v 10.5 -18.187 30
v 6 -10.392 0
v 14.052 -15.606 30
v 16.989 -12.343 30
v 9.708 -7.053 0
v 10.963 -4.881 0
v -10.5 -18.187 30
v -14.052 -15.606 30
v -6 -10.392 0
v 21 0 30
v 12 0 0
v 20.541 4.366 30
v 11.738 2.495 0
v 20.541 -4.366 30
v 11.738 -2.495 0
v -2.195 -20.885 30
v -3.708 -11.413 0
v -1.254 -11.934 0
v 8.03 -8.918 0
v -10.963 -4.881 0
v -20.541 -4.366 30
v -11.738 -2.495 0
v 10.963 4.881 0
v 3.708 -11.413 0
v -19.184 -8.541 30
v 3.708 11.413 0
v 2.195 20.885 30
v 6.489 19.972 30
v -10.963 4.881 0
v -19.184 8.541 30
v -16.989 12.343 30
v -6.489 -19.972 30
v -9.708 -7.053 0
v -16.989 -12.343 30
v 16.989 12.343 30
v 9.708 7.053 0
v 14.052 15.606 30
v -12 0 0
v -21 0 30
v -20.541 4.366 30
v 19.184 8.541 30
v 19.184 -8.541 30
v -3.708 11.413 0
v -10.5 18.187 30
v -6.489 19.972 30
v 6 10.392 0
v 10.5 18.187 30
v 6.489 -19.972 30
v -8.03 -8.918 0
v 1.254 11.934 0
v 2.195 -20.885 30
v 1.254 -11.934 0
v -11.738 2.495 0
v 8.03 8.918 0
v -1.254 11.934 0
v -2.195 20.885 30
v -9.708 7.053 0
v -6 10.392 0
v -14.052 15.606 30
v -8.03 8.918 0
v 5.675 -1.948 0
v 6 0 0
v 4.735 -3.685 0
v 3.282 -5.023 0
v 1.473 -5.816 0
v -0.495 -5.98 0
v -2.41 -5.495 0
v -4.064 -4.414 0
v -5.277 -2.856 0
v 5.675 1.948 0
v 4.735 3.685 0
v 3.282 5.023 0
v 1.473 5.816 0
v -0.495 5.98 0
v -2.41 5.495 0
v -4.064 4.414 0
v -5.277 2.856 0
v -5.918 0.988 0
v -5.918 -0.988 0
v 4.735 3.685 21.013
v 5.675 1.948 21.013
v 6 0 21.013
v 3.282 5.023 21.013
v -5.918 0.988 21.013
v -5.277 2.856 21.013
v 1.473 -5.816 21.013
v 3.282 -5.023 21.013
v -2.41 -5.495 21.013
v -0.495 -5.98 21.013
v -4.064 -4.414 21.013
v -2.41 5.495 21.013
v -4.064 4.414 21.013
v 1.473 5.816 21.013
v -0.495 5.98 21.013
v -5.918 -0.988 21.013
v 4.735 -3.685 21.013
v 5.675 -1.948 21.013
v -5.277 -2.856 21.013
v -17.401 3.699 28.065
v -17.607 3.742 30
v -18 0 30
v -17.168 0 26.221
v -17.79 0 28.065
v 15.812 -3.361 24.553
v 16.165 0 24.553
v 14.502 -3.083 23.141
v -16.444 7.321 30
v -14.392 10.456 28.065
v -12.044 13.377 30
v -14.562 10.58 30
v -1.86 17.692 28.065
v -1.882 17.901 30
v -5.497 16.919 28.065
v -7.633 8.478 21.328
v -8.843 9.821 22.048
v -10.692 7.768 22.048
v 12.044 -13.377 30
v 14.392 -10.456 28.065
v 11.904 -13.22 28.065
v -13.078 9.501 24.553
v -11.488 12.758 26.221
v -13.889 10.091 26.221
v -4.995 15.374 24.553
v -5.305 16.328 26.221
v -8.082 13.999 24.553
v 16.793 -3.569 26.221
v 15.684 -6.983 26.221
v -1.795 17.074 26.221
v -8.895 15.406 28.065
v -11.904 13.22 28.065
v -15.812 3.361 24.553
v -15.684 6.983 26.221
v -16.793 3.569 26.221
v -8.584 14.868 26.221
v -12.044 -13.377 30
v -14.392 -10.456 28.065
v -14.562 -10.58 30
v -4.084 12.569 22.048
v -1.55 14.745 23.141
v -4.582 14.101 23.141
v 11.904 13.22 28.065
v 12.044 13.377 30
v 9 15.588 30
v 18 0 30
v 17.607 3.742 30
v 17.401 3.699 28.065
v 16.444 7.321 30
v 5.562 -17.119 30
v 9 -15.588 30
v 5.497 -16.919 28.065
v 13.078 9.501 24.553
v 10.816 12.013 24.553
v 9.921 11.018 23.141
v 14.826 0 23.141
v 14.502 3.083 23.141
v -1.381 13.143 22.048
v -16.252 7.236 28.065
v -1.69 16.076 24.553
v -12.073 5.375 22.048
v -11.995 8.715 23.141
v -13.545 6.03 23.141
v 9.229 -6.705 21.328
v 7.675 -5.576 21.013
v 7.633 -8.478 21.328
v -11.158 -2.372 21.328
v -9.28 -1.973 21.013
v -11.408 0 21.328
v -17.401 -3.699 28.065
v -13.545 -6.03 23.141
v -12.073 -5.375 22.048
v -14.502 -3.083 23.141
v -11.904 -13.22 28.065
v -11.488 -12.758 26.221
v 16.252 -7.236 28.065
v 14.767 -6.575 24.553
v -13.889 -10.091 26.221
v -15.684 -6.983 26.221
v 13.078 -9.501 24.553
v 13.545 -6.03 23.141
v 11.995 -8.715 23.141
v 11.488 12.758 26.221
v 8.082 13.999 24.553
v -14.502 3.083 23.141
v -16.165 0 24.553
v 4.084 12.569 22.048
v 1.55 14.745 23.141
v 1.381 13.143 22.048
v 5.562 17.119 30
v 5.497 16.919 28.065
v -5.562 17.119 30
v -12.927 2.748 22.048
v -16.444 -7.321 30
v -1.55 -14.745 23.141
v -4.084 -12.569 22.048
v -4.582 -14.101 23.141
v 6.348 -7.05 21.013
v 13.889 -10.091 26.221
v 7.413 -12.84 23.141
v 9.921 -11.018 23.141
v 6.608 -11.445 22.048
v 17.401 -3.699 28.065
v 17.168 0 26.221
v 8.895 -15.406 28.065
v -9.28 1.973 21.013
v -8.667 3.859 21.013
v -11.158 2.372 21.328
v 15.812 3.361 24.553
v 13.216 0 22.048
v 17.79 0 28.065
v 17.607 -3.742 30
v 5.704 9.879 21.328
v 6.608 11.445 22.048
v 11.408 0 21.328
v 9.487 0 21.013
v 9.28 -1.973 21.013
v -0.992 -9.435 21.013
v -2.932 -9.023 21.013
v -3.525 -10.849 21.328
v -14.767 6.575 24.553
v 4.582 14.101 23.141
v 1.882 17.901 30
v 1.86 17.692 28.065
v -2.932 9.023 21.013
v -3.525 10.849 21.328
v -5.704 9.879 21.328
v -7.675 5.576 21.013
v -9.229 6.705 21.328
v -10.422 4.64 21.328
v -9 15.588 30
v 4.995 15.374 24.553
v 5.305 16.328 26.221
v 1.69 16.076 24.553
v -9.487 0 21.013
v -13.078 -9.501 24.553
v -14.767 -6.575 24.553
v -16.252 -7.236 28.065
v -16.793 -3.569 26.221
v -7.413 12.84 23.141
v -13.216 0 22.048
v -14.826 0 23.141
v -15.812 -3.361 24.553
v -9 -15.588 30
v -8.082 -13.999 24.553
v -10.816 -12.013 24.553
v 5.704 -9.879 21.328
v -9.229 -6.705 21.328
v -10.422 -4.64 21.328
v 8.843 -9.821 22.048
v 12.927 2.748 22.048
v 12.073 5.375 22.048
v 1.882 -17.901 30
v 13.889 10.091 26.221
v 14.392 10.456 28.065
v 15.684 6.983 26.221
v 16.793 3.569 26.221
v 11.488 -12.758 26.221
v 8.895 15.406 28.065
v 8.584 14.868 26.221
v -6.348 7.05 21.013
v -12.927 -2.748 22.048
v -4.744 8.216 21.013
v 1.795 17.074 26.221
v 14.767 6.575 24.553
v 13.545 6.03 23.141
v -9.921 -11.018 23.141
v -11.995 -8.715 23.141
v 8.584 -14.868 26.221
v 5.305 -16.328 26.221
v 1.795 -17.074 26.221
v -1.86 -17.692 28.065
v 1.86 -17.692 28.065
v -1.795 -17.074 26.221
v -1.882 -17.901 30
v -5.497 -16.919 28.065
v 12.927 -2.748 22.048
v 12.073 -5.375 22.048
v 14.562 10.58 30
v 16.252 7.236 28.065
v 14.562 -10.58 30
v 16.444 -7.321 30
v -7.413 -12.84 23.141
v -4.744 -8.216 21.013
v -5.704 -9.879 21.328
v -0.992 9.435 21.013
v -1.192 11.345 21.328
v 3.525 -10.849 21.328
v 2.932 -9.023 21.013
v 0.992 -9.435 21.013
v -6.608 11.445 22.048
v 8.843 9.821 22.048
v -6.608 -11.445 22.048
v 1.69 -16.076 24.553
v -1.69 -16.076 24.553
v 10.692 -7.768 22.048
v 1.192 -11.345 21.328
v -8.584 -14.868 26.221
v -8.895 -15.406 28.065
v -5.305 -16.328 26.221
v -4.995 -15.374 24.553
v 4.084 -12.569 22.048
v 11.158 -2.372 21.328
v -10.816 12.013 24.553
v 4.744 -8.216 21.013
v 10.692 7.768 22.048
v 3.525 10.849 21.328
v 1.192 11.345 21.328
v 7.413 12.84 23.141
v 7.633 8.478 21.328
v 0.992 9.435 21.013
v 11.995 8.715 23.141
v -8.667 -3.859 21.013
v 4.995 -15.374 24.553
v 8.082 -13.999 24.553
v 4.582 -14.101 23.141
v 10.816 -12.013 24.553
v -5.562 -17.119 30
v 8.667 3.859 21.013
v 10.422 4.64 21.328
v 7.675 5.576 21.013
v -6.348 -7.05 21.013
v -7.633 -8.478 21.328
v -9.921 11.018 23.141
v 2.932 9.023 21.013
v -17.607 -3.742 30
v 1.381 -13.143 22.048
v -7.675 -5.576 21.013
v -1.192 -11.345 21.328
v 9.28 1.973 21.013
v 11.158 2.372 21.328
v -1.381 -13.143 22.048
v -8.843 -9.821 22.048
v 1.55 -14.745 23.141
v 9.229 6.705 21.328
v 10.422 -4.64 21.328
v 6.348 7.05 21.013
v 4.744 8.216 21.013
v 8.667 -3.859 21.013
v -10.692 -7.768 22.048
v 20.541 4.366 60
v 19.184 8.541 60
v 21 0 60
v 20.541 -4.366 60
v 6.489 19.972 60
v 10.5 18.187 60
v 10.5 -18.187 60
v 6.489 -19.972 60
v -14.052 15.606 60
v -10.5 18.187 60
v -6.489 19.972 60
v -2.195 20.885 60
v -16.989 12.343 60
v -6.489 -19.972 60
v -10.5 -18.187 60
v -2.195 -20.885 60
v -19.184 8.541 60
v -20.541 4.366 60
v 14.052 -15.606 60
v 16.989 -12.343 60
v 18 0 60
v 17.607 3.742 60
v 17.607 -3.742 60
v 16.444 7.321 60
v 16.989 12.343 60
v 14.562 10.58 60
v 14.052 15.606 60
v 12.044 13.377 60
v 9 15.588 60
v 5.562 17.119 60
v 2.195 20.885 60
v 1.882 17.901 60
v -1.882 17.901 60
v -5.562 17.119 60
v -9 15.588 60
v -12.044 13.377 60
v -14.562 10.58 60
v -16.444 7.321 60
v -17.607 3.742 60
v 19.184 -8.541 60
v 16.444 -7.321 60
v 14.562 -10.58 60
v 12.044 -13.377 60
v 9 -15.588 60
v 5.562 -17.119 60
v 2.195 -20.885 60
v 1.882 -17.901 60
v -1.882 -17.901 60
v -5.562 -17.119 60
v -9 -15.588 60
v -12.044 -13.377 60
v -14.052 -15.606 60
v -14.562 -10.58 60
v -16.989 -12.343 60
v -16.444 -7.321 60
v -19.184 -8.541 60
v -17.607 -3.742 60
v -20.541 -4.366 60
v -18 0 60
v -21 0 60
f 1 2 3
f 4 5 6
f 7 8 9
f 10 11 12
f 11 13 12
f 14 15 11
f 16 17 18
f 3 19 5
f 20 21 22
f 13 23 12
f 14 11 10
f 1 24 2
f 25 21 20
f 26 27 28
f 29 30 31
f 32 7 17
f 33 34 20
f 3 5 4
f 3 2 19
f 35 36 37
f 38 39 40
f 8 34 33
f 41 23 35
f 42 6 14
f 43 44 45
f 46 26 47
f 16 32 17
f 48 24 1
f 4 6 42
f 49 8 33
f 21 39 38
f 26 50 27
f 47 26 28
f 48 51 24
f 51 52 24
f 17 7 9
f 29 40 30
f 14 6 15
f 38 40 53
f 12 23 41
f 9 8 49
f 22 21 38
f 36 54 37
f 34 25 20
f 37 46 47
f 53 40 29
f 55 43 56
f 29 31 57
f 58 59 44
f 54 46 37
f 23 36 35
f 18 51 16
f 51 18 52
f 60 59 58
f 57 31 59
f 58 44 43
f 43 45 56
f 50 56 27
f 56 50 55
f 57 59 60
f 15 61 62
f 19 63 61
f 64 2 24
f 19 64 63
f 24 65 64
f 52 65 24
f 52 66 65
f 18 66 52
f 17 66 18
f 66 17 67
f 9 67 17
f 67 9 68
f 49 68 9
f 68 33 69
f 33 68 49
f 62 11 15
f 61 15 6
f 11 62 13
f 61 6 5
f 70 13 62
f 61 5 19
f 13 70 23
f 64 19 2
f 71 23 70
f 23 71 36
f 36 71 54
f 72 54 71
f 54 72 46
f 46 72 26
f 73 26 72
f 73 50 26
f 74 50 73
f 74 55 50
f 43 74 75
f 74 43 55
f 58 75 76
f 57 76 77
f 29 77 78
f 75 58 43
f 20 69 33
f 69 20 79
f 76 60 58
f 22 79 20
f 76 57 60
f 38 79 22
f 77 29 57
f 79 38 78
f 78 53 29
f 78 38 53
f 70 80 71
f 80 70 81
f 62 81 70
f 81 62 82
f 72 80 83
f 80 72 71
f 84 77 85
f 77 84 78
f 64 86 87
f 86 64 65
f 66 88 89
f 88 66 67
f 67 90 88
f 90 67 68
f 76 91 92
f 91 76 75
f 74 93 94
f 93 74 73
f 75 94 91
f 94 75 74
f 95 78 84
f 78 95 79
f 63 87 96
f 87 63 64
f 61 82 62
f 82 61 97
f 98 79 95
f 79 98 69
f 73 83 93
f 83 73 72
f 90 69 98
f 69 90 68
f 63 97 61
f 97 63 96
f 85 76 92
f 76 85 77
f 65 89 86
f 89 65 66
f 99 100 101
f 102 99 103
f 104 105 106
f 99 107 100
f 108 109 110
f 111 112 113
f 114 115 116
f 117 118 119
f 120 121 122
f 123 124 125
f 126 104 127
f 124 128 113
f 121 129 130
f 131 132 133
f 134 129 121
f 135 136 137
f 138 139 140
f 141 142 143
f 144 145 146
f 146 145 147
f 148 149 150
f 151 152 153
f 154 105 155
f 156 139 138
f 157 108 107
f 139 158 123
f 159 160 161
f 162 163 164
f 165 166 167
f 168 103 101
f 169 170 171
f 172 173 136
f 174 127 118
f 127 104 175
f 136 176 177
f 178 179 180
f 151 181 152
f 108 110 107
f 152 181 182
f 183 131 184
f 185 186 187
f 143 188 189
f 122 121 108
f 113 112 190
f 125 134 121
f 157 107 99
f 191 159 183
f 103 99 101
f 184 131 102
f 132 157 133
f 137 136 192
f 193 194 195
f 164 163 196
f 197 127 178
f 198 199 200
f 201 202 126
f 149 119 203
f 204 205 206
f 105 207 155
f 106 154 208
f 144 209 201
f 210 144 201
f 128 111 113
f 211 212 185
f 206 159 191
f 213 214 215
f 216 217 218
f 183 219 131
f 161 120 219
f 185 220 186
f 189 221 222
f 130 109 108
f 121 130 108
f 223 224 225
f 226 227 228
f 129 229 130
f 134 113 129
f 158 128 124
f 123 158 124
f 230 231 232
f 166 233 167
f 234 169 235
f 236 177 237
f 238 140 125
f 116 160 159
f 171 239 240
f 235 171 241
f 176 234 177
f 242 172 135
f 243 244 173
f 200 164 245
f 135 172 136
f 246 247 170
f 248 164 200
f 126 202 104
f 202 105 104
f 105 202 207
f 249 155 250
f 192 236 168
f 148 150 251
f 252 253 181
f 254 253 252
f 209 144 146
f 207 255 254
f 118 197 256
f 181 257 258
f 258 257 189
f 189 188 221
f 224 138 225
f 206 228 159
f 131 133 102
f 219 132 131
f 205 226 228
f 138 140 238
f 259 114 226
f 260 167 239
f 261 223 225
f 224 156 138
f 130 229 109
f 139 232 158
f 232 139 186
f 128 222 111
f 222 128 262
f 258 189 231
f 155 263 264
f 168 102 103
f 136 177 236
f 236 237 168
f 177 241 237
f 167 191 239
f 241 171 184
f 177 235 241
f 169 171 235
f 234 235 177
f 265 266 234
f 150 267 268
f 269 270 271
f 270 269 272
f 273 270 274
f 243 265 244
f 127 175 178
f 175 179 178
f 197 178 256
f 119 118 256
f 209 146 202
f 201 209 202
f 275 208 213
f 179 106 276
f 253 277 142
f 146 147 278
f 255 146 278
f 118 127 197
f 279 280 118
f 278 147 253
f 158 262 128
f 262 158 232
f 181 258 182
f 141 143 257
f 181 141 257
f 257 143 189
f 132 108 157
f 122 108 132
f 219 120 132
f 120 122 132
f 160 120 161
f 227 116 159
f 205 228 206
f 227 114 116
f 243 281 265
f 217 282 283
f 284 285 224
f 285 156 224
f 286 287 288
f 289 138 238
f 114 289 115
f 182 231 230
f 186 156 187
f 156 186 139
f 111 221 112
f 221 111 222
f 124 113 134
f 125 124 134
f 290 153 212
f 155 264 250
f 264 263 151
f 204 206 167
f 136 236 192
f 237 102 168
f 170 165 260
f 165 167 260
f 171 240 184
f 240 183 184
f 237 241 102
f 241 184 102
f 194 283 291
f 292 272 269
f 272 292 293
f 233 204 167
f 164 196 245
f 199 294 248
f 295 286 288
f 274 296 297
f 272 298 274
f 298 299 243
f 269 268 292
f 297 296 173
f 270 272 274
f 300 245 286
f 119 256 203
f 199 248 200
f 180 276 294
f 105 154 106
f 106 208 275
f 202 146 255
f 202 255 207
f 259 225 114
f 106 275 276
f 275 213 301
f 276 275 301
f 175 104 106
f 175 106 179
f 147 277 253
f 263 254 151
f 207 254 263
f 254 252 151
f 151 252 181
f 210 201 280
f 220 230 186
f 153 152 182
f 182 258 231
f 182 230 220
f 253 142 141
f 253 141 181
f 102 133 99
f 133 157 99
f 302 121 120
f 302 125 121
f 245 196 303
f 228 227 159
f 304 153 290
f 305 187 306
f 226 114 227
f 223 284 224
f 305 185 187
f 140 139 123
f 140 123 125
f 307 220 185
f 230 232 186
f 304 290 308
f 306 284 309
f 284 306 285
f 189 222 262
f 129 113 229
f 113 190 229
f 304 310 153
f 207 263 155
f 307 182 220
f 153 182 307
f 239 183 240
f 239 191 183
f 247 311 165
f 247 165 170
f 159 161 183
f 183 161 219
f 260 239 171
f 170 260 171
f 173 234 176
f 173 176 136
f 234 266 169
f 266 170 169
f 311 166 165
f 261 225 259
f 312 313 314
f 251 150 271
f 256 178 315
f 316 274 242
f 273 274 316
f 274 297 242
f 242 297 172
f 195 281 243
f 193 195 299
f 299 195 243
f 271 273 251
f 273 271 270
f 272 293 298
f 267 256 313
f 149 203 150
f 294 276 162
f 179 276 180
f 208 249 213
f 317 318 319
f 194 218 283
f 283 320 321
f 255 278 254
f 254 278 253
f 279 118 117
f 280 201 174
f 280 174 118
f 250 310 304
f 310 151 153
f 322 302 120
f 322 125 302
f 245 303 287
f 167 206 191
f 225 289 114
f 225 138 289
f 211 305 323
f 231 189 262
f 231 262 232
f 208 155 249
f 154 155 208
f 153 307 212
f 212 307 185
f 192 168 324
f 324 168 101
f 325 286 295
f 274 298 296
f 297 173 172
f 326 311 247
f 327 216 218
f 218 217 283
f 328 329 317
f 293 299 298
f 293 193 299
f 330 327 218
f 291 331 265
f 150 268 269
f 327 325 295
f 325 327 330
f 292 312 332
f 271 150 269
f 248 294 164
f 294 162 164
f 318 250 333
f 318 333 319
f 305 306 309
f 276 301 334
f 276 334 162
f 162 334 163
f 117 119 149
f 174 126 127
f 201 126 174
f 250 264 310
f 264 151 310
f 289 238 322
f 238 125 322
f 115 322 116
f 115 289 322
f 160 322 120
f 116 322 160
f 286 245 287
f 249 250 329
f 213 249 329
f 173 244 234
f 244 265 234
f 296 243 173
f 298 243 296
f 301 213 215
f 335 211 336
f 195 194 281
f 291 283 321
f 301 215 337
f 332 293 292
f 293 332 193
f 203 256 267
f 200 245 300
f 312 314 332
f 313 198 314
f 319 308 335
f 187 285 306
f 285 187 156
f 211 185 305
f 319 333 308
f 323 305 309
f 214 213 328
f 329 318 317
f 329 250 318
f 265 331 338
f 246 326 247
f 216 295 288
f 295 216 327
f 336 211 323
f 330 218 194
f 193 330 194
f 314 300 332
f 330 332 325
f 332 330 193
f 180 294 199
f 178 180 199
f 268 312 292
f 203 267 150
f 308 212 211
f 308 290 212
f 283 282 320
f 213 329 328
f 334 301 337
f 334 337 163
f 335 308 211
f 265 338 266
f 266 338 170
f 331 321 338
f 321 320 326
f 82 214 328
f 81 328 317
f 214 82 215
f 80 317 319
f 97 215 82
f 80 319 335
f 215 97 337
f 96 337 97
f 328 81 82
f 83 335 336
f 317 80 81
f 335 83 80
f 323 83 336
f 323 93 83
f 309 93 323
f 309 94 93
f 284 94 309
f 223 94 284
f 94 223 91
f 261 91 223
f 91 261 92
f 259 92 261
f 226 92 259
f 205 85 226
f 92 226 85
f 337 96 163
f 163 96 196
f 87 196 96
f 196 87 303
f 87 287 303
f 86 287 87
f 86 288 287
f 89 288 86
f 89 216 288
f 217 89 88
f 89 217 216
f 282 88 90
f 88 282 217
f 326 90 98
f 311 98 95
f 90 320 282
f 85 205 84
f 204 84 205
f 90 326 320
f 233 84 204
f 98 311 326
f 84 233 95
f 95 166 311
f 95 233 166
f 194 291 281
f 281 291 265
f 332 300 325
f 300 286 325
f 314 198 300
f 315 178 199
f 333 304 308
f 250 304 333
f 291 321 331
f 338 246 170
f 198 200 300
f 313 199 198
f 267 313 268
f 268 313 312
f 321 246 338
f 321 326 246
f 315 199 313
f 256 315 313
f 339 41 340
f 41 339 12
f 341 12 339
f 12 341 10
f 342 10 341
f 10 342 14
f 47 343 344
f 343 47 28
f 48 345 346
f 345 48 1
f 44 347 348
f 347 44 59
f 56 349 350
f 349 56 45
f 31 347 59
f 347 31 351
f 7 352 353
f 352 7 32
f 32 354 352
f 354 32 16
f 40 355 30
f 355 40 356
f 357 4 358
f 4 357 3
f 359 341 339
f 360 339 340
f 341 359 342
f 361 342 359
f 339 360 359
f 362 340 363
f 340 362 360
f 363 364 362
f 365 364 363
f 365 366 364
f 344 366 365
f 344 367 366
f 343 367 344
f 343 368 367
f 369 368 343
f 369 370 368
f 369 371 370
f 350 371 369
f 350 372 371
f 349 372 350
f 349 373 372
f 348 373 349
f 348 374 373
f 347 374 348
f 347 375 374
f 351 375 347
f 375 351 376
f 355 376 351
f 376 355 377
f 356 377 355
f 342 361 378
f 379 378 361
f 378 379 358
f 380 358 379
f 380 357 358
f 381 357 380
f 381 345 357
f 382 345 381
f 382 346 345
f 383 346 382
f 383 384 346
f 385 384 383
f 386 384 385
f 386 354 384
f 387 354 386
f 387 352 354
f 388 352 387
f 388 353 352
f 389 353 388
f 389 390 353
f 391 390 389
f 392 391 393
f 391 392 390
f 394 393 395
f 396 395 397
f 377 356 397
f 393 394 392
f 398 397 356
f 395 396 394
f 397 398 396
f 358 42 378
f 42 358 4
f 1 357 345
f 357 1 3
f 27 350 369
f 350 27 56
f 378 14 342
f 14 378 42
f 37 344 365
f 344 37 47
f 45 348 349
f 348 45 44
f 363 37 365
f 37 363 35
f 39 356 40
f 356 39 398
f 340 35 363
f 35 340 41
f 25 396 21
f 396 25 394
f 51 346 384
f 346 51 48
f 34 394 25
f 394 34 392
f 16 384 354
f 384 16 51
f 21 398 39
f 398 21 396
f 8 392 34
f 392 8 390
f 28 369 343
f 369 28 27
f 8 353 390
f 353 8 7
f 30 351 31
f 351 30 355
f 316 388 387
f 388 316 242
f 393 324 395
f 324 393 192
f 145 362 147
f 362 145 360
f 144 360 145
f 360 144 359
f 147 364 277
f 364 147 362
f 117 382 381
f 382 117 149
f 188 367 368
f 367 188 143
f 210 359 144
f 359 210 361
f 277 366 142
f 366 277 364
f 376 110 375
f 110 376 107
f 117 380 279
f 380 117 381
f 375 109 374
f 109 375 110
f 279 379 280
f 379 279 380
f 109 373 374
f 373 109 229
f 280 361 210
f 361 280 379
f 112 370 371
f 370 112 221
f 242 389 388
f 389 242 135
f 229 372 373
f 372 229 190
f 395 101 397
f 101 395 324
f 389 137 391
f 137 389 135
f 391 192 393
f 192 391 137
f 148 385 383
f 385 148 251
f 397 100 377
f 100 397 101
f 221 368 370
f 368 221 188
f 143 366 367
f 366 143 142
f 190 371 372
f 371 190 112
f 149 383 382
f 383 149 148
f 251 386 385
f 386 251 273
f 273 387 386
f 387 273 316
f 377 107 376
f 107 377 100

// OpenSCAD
module foo() {
   rotate_extrude() translate([12,0,0]) circle(r=6);
   linear_extrude(scale=2,height=30) difference() { 
      circle(r=8);
      circle(r=6);
   }
}

difference() {
   cylinder(r1=12,r2=21,h=30);
   translate([0,0,-0.5]) cylinder(r=6,h=31);
   hull() translate([0,0,30]) scale([1,1,1])
      rotate_extrude() translate([9,0,0]) circle(r=9.0);
}

translate([0,0,30]) difference() {
   cylinder(r=21,h=30);
   translate([0,0,-0.5]) cylinder(r=18,h=31);
}
